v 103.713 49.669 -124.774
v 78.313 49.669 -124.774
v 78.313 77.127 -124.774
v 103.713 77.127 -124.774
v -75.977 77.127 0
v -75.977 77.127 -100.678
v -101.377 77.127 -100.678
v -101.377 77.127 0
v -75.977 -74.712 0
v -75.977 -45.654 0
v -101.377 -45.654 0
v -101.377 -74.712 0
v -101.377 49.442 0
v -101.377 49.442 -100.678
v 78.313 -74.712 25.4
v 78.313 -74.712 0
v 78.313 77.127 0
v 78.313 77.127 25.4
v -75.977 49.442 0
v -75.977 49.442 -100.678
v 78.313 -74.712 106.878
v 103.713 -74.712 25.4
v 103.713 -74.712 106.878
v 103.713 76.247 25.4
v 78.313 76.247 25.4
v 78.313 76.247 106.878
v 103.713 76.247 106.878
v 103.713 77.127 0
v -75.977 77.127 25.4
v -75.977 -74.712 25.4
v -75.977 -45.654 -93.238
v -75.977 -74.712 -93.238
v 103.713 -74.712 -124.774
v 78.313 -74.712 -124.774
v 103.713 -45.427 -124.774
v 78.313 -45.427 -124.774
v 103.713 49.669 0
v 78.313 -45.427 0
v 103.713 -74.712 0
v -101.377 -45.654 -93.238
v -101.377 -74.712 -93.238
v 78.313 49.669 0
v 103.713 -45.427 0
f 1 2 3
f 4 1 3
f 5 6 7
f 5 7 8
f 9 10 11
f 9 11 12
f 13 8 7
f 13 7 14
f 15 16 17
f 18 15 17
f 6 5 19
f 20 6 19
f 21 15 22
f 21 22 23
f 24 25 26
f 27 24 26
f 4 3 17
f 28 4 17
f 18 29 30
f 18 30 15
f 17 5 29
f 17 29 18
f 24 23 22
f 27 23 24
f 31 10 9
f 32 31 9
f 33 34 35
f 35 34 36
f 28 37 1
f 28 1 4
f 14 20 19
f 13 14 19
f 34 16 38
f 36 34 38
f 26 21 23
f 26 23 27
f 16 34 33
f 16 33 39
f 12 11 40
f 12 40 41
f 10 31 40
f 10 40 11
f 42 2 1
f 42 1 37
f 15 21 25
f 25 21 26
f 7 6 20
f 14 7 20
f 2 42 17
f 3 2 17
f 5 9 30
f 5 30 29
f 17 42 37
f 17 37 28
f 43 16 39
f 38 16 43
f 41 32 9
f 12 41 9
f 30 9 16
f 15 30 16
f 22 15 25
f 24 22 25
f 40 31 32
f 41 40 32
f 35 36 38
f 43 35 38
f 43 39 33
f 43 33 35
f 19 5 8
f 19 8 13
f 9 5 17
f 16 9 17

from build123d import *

# Parameters (mm, degrees)
F0_W     = 154.289946
F0_H     = 151.83901
F1_DEPTH = 25.4
F2_W     = 150.958963
F2_H     = 81.478422
F3_DEPTH = 25.4
F4_W     = 29.057968
F4_H     = 93.238361
F5_DEPTH = 25.4
F6_W     = 27.685478
F6_H     = 100.678109
F7_DEPTH = 25.4
F8_W     = 27.458507
F8_H     = 124.773905
F8_W_2   = 29.284947
F9_DEPTH = 25.4


with BuildPart() as f1:
    # F0 (on Top) → F1 (new body)
    with BuildSketch(Plane.XY):
        with Locations((1.16834, 1.207549)):
            Rectangle(F0_W, F0_H)
    extrude(amount=F1_DEPTH)


with BuildPart() as f3:
    # F2 (on face) → F3 (new body)
    with BuildSketch(Plane.YZ.offset(78.313313)):
        with Locations((0.767525, 66.139211)):
            Rectangle(F2_W, F2_H)
    extrude(amount=F3_DEPTH)


with BuildPart() as f5:
    # F4 (on face) → F5 (new body)
    with BuildSketch(Plane(origin=(-75.976633, 0, 0), x_dir=(0, -1, 0), z_dir=(-1, 0, 0))):
        with Locations((60.182972, -46.61918)):
            Rectangle(F4_W, F4_H)
    extrude(amount=F5_DEPTH)


with BuildPart() as f7:
    # F6 (on face) → F7 (new body)
    with BuildSketch(Plane(origin=(-75.976633, 0, 0), x_dir=(0, -1, 0), z_dir=(-1, 0, 0))):
        with Locations((-63.284315, -50.339054)):
            Rectangle(F6_W, F6_H)
    extrude(amount=F7_DEPTH)


with BuildPart() as f9:
    # F8 (on face) → F9 (new body)
    with BuildSketch(Plane.YZ.offset(78.313313)):
        with Locations((63.397801, -62.386952)):
            Rectangle(F8_W, F8_H)
        with Locations((-60.069482, -62.386952)):
            Rectangle(F8_W_2, F8_H)
    extrude(amount=F9_DEPTH)


solid = Compound([f1.part, f3.part, f5.part, f7.part, f9.part])
